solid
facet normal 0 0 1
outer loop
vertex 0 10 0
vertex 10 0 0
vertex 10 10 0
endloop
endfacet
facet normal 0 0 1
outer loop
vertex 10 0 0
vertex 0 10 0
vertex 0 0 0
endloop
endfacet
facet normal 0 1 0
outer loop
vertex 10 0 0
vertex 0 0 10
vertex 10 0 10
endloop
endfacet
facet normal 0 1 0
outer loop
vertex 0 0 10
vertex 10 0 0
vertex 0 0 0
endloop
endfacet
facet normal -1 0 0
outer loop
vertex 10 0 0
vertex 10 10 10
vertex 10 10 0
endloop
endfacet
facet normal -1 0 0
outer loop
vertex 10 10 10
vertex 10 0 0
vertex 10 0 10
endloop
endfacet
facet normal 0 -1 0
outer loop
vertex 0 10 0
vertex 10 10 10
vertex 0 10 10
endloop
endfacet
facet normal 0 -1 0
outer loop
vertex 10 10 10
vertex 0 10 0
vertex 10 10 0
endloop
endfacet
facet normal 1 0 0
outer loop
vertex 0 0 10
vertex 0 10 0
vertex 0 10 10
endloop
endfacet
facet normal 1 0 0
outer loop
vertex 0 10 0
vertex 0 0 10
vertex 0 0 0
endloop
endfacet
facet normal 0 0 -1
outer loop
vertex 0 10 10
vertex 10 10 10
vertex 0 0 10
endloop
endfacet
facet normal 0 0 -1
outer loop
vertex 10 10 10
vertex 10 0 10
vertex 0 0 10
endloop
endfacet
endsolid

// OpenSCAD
// points written twice a hair apart are one point (one object per fixture, as polyhedron-touching.scad):
// a cube whose top corners 5 and 6 are written again 1e-14 off (8, 9) — the same point computed two ways, as
// slice() in Thingiverse 1011192 writes them — one top triangle on the copies and a zero-area face across each
// seam. Closed as written; sewn without welding, the zero-area faces make no valid solid. 1000 mm^3
t = 10 + 1e-14;
polyhedron(
    points = [[0, 0, 0], [10, 0, 0], [10, 10, 0], [0, 10, 0], [0, 0, 10], [10, 0, 10], [10, 10, 10], [0, 10, 10],
              [t, 0, 10], [t, 10, 10]],
    faces = [[0, 3, 2, 1], [0, 1, 5, 4], [1, 2, 6, 5], [2, 3, 7, 6], [3, 0, 4, 7], [4, 6, 7],
             [4, 8, 9], [8, 4, 5], [4, 9, 6], [9, 8, 5], [5, 6, 9]]
);
